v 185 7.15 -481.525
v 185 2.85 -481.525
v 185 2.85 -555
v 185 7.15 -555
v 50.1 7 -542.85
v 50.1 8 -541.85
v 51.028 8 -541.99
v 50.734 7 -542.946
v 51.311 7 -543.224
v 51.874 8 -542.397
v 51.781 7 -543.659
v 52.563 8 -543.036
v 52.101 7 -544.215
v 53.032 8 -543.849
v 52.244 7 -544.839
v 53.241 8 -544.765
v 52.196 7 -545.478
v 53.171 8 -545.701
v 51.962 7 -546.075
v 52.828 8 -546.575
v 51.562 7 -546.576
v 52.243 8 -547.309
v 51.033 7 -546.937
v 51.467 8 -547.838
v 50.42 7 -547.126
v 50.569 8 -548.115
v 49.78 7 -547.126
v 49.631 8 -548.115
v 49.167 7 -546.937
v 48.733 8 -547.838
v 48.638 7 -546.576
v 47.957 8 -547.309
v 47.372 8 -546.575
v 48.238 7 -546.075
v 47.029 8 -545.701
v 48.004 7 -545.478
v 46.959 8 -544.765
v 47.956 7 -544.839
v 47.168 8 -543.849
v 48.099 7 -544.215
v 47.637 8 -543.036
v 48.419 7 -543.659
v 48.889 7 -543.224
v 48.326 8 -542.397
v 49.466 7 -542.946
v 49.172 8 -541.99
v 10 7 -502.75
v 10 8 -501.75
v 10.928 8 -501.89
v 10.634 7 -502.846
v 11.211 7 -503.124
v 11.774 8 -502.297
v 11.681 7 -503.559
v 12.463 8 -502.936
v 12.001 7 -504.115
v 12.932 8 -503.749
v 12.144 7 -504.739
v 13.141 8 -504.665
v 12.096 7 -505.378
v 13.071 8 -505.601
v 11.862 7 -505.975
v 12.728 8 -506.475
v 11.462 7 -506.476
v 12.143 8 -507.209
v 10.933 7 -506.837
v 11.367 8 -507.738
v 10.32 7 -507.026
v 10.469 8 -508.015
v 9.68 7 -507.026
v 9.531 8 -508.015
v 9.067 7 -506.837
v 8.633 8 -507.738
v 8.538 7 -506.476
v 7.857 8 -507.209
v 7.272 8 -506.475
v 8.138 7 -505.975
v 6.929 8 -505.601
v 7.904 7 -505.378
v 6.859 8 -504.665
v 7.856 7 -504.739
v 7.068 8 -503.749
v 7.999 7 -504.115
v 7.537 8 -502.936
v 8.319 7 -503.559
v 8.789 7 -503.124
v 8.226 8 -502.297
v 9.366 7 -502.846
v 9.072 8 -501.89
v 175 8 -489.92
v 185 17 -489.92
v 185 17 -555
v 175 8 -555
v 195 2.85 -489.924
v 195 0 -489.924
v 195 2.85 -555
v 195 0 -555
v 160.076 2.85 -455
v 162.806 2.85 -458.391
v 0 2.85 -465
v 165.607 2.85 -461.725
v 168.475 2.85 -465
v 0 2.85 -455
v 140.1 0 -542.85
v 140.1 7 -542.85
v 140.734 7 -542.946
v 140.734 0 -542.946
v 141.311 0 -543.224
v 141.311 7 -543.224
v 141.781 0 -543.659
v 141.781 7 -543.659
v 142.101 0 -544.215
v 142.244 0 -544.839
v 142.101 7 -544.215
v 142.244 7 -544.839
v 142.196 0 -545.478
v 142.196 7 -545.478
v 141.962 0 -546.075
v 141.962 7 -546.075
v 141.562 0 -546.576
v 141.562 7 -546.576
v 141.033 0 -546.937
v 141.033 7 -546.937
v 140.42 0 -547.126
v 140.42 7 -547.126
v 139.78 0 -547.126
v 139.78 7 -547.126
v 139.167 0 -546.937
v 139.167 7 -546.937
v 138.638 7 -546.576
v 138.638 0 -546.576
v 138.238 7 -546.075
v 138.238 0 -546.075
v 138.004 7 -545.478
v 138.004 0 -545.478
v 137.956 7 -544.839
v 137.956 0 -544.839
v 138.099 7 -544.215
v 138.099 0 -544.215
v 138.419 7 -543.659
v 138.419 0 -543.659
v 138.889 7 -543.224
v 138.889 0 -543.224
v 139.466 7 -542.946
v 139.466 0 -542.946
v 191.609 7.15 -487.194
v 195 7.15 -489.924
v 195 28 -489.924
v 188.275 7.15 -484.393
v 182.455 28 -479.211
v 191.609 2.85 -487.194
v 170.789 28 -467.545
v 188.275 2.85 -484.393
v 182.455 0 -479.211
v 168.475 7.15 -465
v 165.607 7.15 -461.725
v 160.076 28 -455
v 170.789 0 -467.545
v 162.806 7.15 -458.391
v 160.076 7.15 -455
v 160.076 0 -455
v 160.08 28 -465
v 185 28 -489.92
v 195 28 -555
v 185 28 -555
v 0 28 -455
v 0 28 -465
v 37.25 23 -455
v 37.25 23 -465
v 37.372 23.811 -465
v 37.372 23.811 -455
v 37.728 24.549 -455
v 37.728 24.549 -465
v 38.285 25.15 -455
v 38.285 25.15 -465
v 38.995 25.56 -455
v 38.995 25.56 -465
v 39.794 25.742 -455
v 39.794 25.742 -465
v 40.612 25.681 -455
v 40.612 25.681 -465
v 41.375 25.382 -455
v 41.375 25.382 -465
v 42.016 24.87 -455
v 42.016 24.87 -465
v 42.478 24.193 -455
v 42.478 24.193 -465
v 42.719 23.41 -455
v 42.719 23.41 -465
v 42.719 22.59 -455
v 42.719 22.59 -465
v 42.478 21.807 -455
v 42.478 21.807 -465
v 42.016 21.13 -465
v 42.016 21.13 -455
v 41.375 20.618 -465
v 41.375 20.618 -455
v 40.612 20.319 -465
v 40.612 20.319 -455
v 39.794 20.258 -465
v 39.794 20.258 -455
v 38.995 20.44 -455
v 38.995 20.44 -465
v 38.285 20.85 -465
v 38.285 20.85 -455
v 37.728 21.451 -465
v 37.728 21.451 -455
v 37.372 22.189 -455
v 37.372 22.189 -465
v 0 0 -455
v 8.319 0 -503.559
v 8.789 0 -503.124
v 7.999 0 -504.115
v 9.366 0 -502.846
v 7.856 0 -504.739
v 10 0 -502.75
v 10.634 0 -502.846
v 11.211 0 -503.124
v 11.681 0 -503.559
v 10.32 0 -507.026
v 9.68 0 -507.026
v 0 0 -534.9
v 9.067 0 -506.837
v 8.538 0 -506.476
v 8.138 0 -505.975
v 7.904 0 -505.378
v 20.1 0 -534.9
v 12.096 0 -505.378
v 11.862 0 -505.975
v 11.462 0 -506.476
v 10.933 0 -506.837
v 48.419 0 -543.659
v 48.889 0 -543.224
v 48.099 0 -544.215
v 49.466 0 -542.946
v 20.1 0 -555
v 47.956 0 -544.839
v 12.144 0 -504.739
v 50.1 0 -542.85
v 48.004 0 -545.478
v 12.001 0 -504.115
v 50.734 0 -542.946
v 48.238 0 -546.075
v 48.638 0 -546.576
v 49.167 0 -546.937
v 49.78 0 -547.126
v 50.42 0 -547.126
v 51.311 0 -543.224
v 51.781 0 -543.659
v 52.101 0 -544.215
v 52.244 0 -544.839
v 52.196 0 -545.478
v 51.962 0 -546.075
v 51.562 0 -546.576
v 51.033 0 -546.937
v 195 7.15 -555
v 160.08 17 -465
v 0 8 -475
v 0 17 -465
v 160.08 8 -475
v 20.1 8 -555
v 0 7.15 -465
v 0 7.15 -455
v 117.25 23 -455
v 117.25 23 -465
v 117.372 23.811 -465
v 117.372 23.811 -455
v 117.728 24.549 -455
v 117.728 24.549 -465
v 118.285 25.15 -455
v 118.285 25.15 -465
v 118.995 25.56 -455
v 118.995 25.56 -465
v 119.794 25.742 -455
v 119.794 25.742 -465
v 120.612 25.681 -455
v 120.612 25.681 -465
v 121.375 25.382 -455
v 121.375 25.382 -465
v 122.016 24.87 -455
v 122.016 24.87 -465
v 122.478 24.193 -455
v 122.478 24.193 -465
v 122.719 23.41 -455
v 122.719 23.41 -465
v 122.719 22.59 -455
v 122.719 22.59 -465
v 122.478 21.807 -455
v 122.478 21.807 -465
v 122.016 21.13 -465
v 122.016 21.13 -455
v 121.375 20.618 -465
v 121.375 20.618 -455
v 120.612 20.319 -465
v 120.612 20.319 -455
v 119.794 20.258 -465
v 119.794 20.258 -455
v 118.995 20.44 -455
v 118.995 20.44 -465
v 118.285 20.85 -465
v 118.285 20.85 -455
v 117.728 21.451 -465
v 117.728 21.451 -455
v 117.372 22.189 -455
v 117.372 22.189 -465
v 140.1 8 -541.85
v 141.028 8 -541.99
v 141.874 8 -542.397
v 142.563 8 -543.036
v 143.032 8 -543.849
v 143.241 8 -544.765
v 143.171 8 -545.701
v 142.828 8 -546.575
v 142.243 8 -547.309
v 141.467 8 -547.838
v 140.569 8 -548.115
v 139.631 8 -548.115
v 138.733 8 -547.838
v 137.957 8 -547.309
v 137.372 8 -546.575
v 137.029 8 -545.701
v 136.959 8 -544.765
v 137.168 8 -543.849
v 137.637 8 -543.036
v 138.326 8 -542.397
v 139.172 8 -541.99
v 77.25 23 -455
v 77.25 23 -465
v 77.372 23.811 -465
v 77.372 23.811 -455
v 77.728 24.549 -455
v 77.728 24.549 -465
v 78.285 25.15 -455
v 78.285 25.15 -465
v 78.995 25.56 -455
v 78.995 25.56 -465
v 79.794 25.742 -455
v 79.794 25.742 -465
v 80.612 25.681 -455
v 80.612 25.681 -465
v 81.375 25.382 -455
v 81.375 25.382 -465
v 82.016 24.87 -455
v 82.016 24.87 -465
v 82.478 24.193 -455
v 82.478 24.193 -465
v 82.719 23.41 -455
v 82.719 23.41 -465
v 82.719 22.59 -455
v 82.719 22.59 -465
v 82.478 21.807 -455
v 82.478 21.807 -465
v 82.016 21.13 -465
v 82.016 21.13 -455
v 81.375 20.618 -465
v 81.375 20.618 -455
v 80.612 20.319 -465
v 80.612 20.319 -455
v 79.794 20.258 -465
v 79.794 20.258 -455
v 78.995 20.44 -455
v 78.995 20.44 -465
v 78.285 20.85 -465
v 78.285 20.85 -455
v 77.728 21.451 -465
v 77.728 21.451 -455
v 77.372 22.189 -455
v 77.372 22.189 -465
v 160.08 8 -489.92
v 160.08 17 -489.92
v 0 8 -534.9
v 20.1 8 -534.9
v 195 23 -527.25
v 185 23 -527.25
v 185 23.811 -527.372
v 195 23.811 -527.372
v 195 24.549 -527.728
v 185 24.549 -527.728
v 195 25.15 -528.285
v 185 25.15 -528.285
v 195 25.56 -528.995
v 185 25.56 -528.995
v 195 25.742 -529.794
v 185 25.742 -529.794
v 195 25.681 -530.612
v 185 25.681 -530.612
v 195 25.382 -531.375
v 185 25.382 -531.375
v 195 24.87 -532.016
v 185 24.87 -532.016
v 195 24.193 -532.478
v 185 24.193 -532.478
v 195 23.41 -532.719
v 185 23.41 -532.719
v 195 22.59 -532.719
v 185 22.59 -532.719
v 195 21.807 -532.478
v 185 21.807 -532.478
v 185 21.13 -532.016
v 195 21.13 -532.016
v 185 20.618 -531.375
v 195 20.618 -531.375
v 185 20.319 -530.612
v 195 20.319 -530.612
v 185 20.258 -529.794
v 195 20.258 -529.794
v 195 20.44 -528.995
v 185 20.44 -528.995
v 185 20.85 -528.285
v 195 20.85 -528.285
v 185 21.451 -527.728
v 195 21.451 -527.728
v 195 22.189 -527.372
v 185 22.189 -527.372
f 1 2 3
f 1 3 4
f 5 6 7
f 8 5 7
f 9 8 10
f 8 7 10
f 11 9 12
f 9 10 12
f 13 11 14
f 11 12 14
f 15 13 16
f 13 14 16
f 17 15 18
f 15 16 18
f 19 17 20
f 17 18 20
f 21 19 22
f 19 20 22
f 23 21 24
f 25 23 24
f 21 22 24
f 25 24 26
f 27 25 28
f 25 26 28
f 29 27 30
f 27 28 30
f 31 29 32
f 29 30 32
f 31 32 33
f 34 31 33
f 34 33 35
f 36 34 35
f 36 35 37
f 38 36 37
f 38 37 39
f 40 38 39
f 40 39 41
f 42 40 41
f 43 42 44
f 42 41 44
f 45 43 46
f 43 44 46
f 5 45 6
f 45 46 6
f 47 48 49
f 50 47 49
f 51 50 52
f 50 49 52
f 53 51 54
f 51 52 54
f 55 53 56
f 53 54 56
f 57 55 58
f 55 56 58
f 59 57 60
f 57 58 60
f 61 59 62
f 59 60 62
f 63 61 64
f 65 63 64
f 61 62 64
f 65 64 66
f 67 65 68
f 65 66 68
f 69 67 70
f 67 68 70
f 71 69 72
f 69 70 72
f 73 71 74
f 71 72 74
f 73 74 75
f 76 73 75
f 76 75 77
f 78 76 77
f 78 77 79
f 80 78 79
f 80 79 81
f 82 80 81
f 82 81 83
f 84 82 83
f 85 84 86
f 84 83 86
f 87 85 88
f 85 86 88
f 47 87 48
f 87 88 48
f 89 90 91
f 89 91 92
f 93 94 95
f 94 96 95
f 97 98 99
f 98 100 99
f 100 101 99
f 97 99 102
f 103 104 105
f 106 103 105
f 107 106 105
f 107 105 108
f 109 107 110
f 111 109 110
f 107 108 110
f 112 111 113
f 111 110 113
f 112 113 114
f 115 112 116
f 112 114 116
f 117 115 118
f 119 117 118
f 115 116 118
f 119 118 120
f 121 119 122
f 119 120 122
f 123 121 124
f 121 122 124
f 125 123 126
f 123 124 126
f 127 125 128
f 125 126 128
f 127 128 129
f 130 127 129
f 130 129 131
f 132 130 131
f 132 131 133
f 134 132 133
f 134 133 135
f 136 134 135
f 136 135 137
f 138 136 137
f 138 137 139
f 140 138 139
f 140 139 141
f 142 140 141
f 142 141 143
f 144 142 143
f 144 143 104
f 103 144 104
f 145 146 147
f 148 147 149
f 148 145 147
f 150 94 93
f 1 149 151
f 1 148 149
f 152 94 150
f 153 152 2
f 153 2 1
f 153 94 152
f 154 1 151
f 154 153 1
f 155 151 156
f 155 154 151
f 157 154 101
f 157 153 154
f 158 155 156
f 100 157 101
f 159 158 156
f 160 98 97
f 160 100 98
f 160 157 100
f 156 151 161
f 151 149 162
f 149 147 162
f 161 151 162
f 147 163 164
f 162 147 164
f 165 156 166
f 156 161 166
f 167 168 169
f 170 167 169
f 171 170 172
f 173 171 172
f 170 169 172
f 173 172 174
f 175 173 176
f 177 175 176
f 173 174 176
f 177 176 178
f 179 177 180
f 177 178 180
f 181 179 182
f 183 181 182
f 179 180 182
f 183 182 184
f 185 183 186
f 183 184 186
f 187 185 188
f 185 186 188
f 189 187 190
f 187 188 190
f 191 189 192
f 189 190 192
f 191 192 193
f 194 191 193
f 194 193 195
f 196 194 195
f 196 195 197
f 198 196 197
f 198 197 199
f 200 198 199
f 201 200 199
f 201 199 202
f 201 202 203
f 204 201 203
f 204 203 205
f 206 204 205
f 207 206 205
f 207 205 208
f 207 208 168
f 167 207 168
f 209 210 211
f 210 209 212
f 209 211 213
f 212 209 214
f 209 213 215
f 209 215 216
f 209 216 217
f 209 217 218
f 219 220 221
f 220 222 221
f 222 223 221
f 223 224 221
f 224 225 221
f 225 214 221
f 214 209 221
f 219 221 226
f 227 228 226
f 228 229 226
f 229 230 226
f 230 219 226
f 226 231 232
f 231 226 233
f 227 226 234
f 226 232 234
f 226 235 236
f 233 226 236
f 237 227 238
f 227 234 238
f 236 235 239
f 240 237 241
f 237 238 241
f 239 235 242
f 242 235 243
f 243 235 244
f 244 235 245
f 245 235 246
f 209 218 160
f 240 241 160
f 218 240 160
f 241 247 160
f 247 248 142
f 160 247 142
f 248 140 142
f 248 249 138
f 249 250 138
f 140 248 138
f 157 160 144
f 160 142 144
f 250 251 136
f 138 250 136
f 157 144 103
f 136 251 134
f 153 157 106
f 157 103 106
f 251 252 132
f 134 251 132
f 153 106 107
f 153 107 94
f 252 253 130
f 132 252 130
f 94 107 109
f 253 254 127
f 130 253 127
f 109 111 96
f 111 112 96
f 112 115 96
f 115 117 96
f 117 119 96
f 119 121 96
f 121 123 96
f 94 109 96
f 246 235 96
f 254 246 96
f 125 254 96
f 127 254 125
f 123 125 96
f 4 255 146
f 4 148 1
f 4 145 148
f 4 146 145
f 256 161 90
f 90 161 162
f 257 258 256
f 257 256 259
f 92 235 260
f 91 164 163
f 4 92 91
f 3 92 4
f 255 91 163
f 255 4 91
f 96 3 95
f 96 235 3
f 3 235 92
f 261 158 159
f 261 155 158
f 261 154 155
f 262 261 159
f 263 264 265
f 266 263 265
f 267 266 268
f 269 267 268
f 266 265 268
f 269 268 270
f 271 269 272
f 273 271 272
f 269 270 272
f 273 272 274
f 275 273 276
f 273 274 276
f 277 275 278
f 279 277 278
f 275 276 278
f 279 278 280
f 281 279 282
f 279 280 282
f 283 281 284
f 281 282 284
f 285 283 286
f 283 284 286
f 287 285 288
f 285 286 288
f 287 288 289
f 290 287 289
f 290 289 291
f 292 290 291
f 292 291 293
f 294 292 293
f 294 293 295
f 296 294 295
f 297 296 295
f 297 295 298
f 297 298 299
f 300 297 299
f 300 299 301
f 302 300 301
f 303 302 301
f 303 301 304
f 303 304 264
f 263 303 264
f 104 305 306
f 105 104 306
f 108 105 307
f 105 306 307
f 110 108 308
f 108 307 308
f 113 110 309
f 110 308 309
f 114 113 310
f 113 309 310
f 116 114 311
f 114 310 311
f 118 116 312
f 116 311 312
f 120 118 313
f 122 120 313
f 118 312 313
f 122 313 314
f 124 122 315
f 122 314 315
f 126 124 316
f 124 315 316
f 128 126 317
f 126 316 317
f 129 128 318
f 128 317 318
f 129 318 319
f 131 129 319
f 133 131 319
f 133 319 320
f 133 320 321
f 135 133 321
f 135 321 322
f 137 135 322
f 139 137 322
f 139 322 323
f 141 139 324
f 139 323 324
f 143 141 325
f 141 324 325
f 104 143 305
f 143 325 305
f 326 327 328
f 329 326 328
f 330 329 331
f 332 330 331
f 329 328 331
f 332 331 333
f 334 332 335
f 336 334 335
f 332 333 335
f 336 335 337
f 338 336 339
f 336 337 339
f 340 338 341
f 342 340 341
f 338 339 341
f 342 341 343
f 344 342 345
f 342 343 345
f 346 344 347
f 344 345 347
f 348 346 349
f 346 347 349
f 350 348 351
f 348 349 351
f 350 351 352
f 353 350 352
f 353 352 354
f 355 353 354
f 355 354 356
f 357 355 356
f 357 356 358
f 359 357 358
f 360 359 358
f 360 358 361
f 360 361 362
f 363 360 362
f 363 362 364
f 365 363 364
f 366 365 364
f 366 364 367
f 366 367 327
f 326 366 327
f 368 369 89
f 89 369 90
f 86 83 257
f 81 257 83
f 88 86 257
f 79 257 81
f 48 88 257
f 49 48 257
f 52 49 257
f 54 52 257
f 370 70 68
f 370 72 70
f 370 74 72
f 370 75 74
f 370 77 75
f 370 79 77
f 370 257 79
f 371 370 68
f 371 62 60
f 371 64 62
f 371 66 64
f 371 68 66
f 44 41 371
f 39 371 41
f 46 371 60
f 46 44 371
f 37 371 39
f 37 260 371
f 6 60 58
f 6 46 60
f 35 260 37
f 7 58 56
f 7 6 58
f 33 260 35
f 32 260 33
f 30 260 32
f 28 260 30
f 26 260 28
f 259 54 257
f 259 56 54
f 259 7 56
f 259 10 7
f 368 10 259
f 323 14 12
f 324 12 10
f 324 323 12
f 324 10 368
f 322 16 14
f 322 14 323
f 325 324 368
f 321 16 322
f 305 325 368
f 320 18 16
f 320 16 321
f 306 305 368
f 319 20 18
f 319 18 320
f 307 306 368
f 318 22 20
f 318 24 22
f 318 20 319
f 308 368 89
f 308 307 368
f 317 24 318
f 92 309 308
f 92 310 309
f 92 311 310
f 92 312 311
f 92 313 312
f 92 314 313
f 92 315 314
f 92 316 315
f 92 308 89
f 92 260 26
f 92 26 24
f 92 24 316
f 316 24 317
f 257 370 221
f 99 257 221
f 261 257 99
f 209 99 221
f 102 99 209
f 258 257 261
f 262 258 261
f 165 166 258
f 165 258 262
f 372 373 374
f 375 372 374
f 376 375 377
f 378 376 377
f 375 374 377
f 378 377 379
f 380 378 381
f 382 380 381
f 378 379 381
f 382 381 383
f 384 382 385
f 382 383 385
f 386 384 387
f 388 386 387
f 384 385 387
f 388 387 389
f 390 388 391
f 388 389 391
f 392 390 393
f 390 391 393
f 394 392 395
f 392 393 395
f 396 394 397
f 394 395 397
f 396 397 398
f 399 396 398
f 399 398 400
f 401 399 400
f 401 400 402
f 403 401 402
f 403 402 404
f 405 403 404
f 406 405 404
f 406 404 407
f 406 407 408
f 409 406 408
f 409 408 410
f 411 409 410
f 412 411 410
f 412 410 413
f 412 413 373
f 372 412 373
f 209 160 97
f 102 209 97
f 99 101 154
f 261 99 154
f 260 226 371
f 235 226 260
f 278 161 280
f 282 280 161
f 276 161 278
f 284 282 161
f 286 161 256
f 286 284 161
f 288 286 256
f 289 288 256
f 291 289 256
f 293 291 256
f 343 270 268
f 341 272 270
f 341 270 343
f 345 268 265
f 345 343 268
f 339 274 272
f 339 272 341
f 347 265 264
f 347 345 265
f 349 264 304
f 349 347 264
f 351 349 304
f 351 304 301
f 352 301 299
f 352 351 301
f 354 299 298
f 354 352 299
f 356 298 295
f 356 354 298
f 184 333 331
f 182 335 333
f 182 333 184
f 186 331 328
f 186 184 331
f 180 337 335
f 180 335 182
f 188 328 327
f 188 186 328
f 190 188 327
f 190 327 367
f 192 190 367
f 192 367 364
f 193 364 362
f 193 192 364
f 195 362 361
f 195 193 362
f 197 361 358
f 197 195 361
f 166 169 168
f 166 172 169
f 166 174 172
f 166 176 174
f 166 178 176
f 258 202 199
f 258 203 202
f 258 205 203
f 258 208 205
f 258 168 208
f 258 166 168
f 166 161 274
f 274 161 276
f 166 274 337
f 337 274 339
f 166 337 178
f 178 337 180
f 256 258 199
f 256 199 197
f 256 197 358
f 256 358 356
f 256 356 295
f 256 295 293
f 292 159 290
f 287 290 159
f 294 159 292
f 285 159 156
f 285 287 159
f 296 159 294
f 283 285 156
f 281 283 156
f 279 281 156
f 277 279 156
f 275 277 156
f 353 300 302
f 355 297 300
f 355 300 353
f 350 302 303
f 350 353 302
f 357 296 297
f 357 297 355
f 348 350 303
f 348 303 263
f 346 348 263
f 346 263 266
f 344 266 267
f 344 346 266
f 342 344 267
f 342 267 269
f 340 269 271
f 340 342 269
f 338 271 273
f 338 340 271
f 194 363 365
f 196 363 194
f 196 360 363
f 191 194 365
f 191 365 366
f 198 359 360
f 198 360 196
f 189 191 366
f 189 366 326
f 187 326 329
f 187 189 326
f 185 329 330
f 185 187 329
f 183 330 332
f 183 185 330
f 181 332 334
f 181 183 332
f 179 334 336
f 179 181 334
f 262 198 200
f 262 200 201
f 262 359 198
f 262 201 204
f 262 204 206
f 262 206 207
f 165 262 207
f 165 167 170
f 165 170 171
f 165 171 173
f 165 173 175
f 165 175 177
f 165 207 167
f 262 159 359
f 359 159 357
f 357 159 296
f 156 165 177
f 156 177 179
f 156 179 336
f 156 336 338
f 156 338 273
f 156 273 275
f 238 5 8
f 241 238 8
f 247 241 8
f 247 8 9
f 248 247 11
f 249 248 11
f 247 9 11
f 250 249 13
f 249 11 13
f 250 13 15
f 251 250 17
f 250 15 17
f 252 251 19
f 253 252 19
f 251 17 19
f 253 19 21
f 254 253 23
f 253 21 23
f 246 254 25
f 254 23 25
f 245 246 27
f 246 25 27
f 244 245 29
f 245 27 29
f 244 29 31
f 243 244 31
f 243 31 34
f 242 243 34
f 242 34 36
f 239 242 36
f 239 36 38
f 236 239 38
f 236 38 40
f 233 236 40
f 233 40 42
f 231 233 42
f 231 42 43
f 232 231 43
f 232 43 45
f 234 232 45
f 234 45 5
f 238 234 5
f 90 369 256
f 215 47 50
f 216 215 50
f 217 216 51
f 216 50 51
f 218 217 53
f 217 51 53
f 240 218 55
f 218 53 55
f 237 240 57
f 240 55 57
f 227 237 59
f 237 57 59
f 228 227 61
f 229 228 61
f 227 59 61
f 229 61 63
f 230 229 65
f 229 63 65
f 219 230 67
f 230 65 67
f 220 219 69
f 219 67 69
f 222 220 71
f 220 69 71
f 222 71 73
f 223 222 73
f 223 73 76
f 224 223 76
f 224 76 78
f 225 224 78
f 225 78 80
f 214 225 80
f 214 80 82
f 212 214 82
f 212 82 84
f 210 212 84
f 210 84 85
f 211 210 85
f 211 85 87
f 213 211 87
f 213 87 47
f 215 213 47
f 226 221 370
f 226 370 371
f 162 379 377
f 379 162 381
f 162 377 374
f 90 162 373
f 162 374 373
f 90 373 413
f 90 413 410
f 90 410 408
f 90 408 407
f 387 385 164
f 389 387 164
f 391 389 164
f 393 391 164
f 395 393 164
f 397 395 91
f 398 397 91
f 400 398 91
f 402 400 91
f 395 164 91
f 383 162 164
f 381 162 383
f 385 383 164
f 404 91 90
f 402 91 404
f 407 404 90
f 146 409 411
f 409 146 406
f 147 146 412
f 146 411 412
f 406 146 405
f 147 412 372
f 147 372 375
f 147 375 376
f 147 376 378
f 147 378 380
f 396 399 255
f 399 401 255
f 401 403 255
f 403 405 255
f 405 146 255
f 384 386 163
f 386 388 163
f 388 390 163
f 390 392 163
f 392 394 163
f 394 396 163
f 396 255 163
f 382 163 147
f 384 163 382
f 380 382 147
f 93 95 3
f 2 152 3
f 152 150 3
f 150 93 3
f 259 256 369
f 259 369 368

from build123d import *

# Parameters (mm, degrees)
SKETCH1_W                = 650
SKETCH1_H                = 650
BOSS_EXTRUDE1_DEPTH      = 8
BOSS_EXTRUDE2_DEPTH      = 650
CUT_EXTRUDE2_DEPTH       = 921.277302922
CUT_EXTRUDE2_DEPTH_BACK  = 921.277302922
SKETCH4_R                = 11
CUT_EXTRUDE1_DEPTH       = 920.932062709
CUT_EXTRUDE1_DEPTH_BACK  = 920.932062709
SKETCH2_R                = 210
CUT_EXTRUDE3_DEPTH       = 921.277302998
CUT_EXTRUDE3_DEPTH_BACK  = 110
CUT_EXTRUDE4_DEPTH       = 110
CUT_EXTRUDE5_DEPTH       = 920.932062713
CUT_EXTRUDE5_DEPTH_BACK  = 920.932062713
SKETCH7_OUTSIDE_W        = 836.056
SKETCH7_OUTSIDE_H        = 836.056
BOSS_EXTRUDE3_DEPTH      = 160.08
BOSS_EXTRUDE4_DEPTH      = 160.08
SKETCH21_W               = 10
SKETCH21_H               = 4.3
CUT_EXTRUDE10_DEPTH      = 680.197320372
SKETCH22_W               = 10
SKETCH22_H               = 4.3
CUT_EXTRUDE11_DEPTH      = 278.189465889
BOSS_EXTRUDE5_DEPTH      = 60
CUT_EXTRUDE6_DEPTH       = 679.914574891
CUT_EXTRUDE6_DEPTH_BACK  = 679.914574891
SKETCH12_R               = 210
CUT_EXTRUDE14_DEPTH      = 11
SKETCH27_R               = 2.2
SKETCH27_R_2             = 2.75
CUT_EXTRUDE15_DEPTH      = 11
SKETCH28_R               = 2.75
CUT_EXTRUDE16_DEPTH      = 11
SKETCH29_W               = 20
SKETCH29_H               = 20
CUT_EXTRUDE17_DEPTH      = 10
CUT_EXTRUDE18_DEPTH      = 679.914574891
CUT_EXTRUDE18_DEPTH_BACK = 679.914574891
SKETCH30_W               = 195
SKETCH30_H               = 95
CUT_EXTRUDE19_DEPTH      = 589.600033979
CUT_EXTRUDE19_DEPTH_BACK = 589.600033979
SKETCH31_W               = 20.1
SKETCH31_H               = 20.1
SKETCH32_R               = 2.15
CUT_EXTRUDE20_DEPTH      = 10
CHAMFER1_SIZE            = 1


with BuildPart() as part:
    # Sketch1 → Boss-Extrude1 (new body)
    with BuildSketch(Plane(origin=(0, 0, 0), x_dir=(1, 0, 0), z_dir=(0, 1, 0))):
        with Locations((325, 325)):
            Rectangle(SKETCH1_W, SKETCH1_H)
    extrude(amount=BOSS_EXTRUDE1_DEPTH)

    # Sketch3 → Boss-Extrude2 (add)
    with BuildSketch(Plane.XY):
        Polygon((300, 43.707142143), (350, 43.707142143), (385, 8), (265, 8), align=None)
    extrude(amount=-BOSS_EXTRUDE2_DEPTH)

    # Sketch4 → Cut-Extrude2 (cut, two sides: drawn at the far end of the back side and taken through both)
    with BuildSketch(Plane.XY.offset(-CUT_EXTRUDE2_DEPTH_BACK)):
        with Locations((325, 22)):
            Circle(SKETCH4_R)
    extrude(amount=CUT_EXTRUDE2_DEPTH + CUT_EXTRUDE2_DEPTH_BACK, mode=Mode.SUBTRACT)

    # Sketch2 → Cut-Extrude1 (cut, two sides: drawn at the far end of the back side and taken through both)
    with BuildSketch(Plane(origin=(0, 8, 0), x_dir=(1, 0, 0), z_dir=(0, 1, 0)).offset(-CUT_EXTRUDE1_DEPTH_BACK)):
        with Locations(Location((325, 325, 0), (0, 0, 270))):
            Circle(SKETCH2_R)
    extrude(amount=CUT_EXTRUDE1_DEPTH + CUT_EXTRUDE1_DEPTH_BACK, mode=Mode.SUBTRACT)

    # Sketch5 → Cut-Extrude3 (cut, two sides: drawn at the far end of the back side and taken through both)
    with BuildSketch(Plane.XY.offset(-CUT_EXTRUDE3_DEPTH_BACK)):
        Polygon((300, 43.707142143), (350, 43.707142143), (365.396078824, 28), (350, 28), (350, 8), (300, 8), (300, 28), (284.603921176, 28), align=None)
    extrude(amount=CUT_EXTRUDE3_DEPTH + CUT_EXTRUDE3_DEPTH_BACK, mode=Mode.SUBTRACT)

    # Sketch6 → Cut-Extrude4 (cut)
    with BuildSketch(Plane(origin=(0, 0, -650), x_dir=(-1, 0, 0), z_dir=(0, 0, -1))):
        Polygon((-350, 43.707142143), (-300, 43.707142143), (-284.603921176, 28), (-300, 28), (-300, 8), (-350, 8), (-350, 28), (-365.396078824, 28), align=None)
    extrude(amount=-CUT_EXTRUDE4_DEPTH, mode=Mode.SUBTRACT)

    # Sketch7 outside → Cut-Extrude5 (cut, two sides: drawn at the far end of the back side and taken through both)
    with BuildSketch(Plane(origin=(0, 8, 0), x_dir=(1, 0, 0), z_dir=(0, 1, 0)).offset(-CUT_EXTRUDE5_DEPTH_BACK)):
        with Locations((325, 325)):
            Rectangle(SKETCH7_OUTSIDE_W, SKETCH7_OUTSIDE_H)
        Polygon((195, 455), (195, 489.924225025), (195, 650), (167.478198198, 686.544504505), (-70.838918919, 686.544504505), (-70.838918919, 472.462112512), (0, 455), (160.075774975, 455), align=None, mode=Mode.SUBTRACT)
    extrude(amount=CUT_EXTRUDE5_DEPTH + CUT_EXTRUDE5_DEPTH_BACK, mode=Mode.SUBTRACT)

    # Sketch8 → Boss-Extrude3 (add)
    with BuildSketch(Plane(origin=(0, 0, -650), x_dir=(-1, 0, 0), z_dir=(0, 0, -1))):
        Polygon((-195, 8), (-195, 28), (-185, 28), (-185, 17), (-175, 8), align=None)
    extrude(amount=-BOSS_EXTRUDE3_DEPTH)

    # Sketch10 → Boss-Extrude4 (add)
    with BuildSketch(Plane.ZY):
        Polygon((-455, 8), (-455, 28), (-465, 28), (-465, 17), (-475, 8), align=None)
    extrude(amount=-BOSS_EXTRUDE4_DEPTH)

    # Sketch21 → Cut-Extrude10 (cut, through all)
    with BuildSketch(Plane.ZY):
        with Locations((-460, 5)):
            Rectangle(SKETCH21_W, SKETCH21_H)
    extrude(amount=-CUT_EXTRUDE10_DEPTH, mode=Mode.SUBTRACT)

    # Sketch22 → Cut-Extrude11 (cut, through all)
    with BuildSketch(Plane(origin=(0, 0, -650), x_dir=(-1, 0, 0), z_dir=(0, 0, -1))):
        with Locations((-190, 5)):
            Rectangle(SKETCH22_W, SKETCH22_H)
    extrude(amount=-CUT_EXTRUDE11_DEPTH, mode=Mode.SUBTRACT)

    # Sketch23 → Boss-Extrude5 (add)
    with BuildSketch(Plane.XY.offset(-489.92)):
        Polygon((194.99464011, 8), (195, 28), (160.08, 28), (160.08, 8), align=None)
    extrude(amount=BOSS_EXTRUDE5_DEPTH)

    # Sketch12 → Cut-Extrude6 (cut, two sides: drawn at the far end of the back side and taken through both)
    with BuildSketch(Plane(origin=(0, 8, 0), x_dir=(1, 0, 0), z_dir=(0, 1, 0)).offset(-CUT_EXTRUDE6_DEPTH_BACK)):
        with Locations((325, 325)):
            Circle(SKETCH12_R)
    extrude(amount=CUT_EXTRUDE6_DEPTH + CUT_EXTRUDE6_DEPTH_BACK, mode=Mode.SUBTRACT)

    # Sketch26 → Cut-Extrude14 (cut)
    with BuildSketch(Plane(origin=(0, 28, 0), x_dir=(1, 0, 0), z_dir=(0, 1, 0))):
        Polygon((185, 489.92), (160.08, 489.92), (160.08, 465), align=None)
    extrude(amount=-CUT_EXTRUDE14_DEPTH, mode=Mode.SUBTRACT)

    # Sketch27 → Cut-Extrude15 (cut)
    with BuildSketch(Plane.ZY.offset(-185)):
        with Locations((-610, 23)):
            Circle(SKETCH27_R)
        with Locations((-570, 23)):
            Circle(SKETCH27_R)
        with Locations((-530, 23)):
            Circle(SKETCH27_R_2)
    extrude(amount=-CUT_EXTRUDE15_DEPTH, mode=Mode.SUBTRACT)

    # Sketch28 → Cut-Extrude16 (cut)
    with BuildSketch(Plane(origin=(0, 0, -465), x_dir=(-1, 0, 0), z_dir=(0, 0, -1))):
        with Locations((-120, 23)):
            Circle(SKETCH28_R)
        with Locations((-80, 23)):
            Circle(SKETCH28_R)
        with Locations((-40, 23)):
            Circle(SKETCH28_R)
    extrude(amount=-CUT_EXTRUDE16_DEPTH, mode=Mode.SUBTRACT)

    # Sketch29 → Cut-Extrude17 (cut)
    with BuildSketch(Plane(origin=(0, 8, 0), x_dir=(1, 0, 0), z_dir=(0, 1, 0))):
        with Locations((10, 640)):
            Rectangle(SKETCH29_W, SKETCH29_H)
    extrude(amount=-CUT_EXTRUDE17_DEPTH, mode=Mode.SUBTRACT)

    # Sketch30 → Cut-Extrude18 (cut, two sides: drawn at the far end of the back side and taken through both)
    with BuildSketch(Plane(origin=(0, 8, 0), x_dir=(1, 0, 0), z_dir=(0, 1, 0)).offset(-CUT_EXTRUDE18_DEPTH_BACK)):
        with Locations((97.5, 602.5)):
            Rectangle(SKETCH30_W, SKETCH30_H)
    extrude(amount=CUT_EXTRUDE18_DEPTH + CUT_EXTRUDE18_DEPTH_BACK, mode=Mode.SUBTRACT)

    # Sketch31 → Cut-Extrude19 (cut, two sides: drawn at the far end of the back side and taken through both)
    with BuildSketch(Plane(origin=(0, 8, 0), x_dir=(1, 0, 0), z_dir=(0, 1, 0)).offset(-CUT_EXTRUDE19_DEPTH_BACK)):
        with Locations((10.05, 544.95)):
            Rectangle(SKETCH31_W, SKETCH31_H)
    extrude(amount=CUT_EXTRUDE19_DEPTH + CUT_EXTRUDE19_DEPTH_BACK, mode=Mode.SUBTRACT)

    # Sketch32 → Cut-Extrude20 (cut)
    with BuildSketch(Plane(origin=(0, 8, 0), x_dir=(1, 0, 0), z_dir=(0, 1, 0))):
        with Locations(Location((50.1, 545, 0), (0, 0, 270))):
            Circle(SKETCH32_R)
        with Locations(Location((140.1, 545, 0), (0, 0, 270))):
            Circle(SKETCH32_R)
        with Locations(Location((10, 504.9, 0), (0, 0, 270))):
            Circle(SKETCH32_R)
    extrude(amount=-CUT_EXTRUDE20_DEPTH, mode=Mode.SUBTRACT)

    # Chamfer1
    chamfer1_edges = [part.edges().sort_by_distance(p)[0] for p in [
        (10, 8, -507.05),
        (140.1, 8, -547.15),
        (50.1, 8, -547.15),
    ]]
    chamfer(chamfer1_edges, length=CHAMFER1_SIZE)


solid = part.part
